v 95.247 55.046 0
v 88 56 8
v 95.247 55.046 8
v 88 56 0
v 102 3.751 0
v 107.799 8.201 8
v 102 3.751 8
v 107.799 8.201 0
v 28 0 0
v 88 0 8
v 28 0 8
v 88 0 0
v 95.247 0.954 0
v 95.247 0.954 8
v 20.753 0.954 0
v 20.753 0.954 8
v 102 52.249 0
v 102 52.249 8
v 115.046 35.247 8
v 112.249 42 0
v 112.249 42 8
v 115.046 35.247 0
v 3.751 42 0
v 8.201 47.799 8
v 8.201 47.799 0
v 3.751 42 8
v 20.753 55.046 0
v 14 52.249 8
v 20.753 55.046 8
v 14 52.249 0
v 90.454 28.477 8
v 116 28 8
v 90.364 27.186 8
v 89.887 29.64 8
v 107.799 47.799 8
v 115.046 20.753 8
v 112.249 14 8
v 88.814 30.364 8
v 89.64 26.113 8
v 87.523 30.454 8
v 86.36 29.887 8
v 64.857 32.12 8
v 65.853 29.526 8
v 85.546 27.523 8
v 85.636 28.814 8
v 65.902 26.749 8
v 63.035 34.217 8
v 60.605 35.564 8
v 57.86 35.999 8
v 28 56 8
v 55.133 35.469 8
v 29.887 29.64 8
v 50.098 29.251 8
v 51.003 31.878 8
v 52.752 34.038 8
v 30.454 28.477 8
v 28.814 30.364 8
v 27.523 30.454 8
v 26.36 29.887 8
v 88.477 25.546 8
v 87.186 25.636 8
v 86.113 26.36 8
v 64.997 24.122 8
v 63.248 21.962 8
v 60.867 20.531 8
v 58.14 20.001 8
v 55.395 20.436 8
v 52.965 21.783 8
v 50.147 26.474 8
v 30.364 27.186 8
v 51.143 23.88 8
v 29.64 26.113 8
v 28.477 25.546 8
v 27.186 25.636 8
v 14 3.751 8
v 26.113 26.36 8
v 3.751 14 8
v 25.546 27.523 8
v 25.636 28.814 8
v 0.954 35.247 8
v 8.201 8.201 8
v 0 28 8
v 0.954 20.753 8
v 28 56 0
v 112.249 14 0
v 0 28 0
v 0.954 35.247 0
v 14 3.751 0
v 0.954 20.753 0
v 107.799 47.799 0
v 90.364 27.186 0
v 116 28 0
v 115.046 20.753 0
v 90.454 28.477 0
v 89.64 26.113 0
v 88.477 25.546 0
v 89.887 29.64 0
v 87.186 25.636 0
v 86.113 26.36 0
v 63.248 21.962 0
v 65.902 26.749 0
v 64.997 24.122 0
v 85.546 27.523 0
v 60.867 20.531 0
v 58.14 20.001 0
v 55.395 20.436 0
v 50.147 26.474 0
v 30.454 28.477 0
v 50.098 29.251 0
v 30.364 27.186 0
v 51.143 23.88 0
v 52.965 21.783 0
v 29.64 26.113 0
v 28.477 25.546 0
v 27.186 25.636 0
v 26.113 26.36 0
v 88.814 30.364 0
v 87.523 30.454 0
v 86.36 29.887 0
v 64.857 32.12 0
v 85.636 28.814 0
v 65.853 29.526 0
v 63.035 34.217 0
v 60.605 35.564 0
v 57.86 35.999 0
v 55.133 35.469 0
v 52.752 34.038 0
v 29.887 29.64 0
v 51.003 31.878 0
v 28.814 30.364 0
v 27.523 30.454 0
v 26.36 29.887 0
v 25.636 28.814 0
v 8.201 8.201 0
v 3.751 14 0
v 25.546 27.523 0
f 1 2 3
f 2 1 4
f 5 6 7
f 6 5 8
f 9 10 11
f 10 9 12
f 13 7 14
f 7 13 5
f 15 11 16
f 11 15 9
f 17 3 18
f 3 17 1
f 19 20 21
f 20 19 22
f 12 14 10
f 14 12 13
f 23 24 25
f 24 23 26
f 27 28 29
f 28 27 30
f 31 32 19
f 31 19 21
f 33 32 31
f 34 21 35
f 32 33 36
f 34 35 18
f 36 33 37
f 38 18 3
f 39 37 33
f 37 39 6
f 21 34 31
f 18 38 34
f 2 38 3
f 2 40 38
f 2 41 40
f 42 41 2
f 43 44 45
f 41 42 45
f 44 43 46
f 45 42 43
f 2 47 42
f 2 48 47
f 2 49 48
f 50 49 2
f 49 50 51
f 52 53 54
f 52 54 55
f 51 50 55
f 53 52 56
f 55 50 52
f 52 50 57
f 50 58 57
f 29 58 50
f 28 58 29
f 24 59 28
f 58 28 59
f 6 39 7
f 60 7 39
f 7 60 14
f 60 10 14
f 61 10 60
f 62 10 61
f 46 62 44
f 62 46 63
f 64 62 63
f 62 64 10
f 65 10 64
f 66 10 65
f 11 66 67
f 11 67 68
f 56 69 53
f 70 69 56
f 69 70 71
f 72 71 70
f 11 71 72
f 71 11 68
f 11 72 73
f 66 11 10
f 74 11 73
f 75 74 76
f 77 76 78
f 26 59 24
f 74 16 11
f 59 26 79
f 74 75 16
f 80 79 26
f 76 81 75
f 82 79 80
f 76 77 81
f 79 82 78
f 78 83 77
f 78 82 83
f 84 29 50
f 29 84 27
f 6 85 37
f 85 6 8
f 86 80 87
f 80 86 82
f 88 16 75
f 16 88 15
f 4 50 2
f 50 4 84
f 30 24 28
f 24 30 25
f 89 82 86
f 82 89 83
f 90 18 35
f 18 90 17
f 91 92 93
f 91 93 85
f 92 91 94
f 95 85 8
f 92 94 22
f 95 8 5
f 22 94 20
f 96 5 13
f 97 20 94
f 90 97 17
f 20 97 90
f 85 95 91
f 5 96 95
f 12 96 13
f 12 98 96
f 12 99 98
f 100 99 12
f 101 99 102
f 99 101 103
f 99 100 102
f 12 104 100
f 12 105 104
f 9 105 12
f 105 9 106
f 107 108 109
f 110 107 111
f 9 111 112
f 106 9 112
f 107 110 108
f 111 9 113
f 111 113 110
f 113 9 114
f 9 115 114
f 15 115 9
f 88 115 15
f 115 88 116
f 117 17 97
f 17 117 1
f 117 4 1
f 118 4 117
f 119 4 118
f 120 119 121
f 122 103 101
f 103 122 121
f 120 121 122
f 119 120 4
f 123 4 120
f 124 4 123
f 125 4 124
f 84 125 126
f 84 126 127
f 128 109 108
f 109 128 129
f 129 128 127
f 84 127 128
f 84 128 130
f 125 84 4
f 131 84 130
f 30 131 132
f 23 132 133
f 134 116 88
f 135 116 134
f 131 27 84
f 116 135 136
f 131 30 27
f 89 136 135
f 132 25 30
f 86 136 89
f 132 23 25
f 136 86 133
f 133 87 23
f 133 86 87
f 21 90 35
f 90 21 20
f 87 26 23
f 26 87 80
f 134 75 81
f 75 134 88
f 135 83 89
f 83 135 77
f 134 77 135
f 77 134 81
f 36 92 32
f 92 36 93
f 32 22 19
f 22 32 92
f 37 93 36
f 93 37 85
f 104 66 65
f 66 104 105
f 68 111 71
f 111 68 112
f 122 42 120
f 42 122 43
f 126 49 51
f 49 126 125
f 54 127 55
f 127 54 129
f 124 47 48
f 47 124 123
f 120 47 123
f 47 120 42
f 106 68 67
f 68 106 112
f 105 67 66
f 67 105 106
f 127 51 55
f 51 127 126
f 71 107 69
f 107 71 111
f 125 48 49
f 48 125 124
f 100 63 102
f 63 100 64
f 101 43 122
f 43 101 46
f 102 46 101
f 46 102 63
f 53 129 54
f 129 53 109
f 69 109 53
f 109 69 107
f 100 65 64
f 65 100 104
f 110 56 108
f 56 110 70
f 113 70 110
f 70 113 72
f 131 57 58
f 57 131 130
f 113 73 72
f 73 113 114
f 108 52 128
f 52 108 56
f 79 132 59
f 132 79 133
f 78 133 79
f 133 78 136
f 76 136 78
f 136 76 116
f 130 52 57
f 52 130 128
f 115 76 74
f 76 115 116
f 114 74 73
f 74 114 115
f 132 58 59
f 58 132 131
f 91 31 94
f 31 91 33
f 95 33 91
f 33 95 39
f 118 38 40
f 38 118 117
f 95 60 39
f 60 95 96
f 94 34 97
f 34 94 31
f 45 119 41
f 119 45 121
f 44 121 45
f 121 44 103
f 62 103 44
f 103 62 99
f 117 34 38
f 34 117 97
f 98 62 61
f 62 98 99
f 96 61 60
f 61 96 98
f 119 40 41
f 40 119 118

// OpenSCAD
$fn = 32;

// ----------------------------------------------------------------------
// Spacer plate: obround span 60, caps R28
// ----------------------------------------------------------------------

// --- parameters (mm) ---
bore_r = 8;               // centre bore radius
bolt_r = 2.5;             // bolt hole radius
plate_t = 8;              // plate thickness, Z (extrusion height)
span = 60;                // obround span
cap_r = 28;               // cap radius

profile = [[28, 56], [20.753, 55.046], [14, 52.249], [8.201, 47.799], [3.751, 42], [0.954, 35.247], [0, 28], [0.954, 20.753], [3.751, 14], [8.201, 8.201], [14, 3.751], [20.753, 0.954], [28, 0], [88, 0], [95.247, 0.954], [102, 3.751], [107.799, 8.201], [112.249, 14], [115.046, 20.753], [116, 28], [115.046, 35.247], [112.249, 42], [107.799, 47.799], [102, 52.249], [95.247, 55.046], [88, 56]];  // primary outline, 26 points, counter clockwise
void_1 = [[65.853, 29.526], [64.857, 32.12], [63.035, 34.217], [60.605, 35.564], [57.86, 35.999], [55.133, 35.469], [52.752, 34.038], [51.003, 31.878], [50.098, 29.251], [50.147, 26.474], [51.143, 23.88], [52.965, 21.783], [55.395, 20.436], [58.14, 20.001], [60.867, 20.531], [63.248, 21.962], [64.997, 24.122], [65.902, 26.749]];  // centre bore, 18 points
void_2 = [[30.454, 28.477], [29.887, 29.64], [28.814, 30.364], [27.523, 30.454], [26.36, 29.887], [25.636, 28.814], [25.546, 27.523], [26.113, 26.36], [27.186, 25.636], [28.477, 25.546], [29.64, 26.113], [30.364, 27.186]];  // end hole, 12 points
void_3 = [[90.454, 28.477], [89.887, 29.64], [88.814, 30.364], [87.523, 30.454], [86.36, 29.887], [85.636, 28.814], [85.546, 27.523], [86.113, 26.36], [87.186, 25.636], [88.477, 25.546], [89.64, 26.113], [90.364, 27.186]];  // end hole, 12 points

// --- the one profile operation ---
difference() {
  linear_extrude(height = plate_t) polygon(points = profile);
  translate([0, 0, -1])
    linear_extrude(height = plate_t + 2) polygon(points = void_1);
  translate([0, 0, -1])
    linear_extrude(height = plate_t + 2) polygon(points = void_2);
  translate([0, 0, -1])
    linear_extrude(height = plate_t + 2) polygon(points = void_3);
}
